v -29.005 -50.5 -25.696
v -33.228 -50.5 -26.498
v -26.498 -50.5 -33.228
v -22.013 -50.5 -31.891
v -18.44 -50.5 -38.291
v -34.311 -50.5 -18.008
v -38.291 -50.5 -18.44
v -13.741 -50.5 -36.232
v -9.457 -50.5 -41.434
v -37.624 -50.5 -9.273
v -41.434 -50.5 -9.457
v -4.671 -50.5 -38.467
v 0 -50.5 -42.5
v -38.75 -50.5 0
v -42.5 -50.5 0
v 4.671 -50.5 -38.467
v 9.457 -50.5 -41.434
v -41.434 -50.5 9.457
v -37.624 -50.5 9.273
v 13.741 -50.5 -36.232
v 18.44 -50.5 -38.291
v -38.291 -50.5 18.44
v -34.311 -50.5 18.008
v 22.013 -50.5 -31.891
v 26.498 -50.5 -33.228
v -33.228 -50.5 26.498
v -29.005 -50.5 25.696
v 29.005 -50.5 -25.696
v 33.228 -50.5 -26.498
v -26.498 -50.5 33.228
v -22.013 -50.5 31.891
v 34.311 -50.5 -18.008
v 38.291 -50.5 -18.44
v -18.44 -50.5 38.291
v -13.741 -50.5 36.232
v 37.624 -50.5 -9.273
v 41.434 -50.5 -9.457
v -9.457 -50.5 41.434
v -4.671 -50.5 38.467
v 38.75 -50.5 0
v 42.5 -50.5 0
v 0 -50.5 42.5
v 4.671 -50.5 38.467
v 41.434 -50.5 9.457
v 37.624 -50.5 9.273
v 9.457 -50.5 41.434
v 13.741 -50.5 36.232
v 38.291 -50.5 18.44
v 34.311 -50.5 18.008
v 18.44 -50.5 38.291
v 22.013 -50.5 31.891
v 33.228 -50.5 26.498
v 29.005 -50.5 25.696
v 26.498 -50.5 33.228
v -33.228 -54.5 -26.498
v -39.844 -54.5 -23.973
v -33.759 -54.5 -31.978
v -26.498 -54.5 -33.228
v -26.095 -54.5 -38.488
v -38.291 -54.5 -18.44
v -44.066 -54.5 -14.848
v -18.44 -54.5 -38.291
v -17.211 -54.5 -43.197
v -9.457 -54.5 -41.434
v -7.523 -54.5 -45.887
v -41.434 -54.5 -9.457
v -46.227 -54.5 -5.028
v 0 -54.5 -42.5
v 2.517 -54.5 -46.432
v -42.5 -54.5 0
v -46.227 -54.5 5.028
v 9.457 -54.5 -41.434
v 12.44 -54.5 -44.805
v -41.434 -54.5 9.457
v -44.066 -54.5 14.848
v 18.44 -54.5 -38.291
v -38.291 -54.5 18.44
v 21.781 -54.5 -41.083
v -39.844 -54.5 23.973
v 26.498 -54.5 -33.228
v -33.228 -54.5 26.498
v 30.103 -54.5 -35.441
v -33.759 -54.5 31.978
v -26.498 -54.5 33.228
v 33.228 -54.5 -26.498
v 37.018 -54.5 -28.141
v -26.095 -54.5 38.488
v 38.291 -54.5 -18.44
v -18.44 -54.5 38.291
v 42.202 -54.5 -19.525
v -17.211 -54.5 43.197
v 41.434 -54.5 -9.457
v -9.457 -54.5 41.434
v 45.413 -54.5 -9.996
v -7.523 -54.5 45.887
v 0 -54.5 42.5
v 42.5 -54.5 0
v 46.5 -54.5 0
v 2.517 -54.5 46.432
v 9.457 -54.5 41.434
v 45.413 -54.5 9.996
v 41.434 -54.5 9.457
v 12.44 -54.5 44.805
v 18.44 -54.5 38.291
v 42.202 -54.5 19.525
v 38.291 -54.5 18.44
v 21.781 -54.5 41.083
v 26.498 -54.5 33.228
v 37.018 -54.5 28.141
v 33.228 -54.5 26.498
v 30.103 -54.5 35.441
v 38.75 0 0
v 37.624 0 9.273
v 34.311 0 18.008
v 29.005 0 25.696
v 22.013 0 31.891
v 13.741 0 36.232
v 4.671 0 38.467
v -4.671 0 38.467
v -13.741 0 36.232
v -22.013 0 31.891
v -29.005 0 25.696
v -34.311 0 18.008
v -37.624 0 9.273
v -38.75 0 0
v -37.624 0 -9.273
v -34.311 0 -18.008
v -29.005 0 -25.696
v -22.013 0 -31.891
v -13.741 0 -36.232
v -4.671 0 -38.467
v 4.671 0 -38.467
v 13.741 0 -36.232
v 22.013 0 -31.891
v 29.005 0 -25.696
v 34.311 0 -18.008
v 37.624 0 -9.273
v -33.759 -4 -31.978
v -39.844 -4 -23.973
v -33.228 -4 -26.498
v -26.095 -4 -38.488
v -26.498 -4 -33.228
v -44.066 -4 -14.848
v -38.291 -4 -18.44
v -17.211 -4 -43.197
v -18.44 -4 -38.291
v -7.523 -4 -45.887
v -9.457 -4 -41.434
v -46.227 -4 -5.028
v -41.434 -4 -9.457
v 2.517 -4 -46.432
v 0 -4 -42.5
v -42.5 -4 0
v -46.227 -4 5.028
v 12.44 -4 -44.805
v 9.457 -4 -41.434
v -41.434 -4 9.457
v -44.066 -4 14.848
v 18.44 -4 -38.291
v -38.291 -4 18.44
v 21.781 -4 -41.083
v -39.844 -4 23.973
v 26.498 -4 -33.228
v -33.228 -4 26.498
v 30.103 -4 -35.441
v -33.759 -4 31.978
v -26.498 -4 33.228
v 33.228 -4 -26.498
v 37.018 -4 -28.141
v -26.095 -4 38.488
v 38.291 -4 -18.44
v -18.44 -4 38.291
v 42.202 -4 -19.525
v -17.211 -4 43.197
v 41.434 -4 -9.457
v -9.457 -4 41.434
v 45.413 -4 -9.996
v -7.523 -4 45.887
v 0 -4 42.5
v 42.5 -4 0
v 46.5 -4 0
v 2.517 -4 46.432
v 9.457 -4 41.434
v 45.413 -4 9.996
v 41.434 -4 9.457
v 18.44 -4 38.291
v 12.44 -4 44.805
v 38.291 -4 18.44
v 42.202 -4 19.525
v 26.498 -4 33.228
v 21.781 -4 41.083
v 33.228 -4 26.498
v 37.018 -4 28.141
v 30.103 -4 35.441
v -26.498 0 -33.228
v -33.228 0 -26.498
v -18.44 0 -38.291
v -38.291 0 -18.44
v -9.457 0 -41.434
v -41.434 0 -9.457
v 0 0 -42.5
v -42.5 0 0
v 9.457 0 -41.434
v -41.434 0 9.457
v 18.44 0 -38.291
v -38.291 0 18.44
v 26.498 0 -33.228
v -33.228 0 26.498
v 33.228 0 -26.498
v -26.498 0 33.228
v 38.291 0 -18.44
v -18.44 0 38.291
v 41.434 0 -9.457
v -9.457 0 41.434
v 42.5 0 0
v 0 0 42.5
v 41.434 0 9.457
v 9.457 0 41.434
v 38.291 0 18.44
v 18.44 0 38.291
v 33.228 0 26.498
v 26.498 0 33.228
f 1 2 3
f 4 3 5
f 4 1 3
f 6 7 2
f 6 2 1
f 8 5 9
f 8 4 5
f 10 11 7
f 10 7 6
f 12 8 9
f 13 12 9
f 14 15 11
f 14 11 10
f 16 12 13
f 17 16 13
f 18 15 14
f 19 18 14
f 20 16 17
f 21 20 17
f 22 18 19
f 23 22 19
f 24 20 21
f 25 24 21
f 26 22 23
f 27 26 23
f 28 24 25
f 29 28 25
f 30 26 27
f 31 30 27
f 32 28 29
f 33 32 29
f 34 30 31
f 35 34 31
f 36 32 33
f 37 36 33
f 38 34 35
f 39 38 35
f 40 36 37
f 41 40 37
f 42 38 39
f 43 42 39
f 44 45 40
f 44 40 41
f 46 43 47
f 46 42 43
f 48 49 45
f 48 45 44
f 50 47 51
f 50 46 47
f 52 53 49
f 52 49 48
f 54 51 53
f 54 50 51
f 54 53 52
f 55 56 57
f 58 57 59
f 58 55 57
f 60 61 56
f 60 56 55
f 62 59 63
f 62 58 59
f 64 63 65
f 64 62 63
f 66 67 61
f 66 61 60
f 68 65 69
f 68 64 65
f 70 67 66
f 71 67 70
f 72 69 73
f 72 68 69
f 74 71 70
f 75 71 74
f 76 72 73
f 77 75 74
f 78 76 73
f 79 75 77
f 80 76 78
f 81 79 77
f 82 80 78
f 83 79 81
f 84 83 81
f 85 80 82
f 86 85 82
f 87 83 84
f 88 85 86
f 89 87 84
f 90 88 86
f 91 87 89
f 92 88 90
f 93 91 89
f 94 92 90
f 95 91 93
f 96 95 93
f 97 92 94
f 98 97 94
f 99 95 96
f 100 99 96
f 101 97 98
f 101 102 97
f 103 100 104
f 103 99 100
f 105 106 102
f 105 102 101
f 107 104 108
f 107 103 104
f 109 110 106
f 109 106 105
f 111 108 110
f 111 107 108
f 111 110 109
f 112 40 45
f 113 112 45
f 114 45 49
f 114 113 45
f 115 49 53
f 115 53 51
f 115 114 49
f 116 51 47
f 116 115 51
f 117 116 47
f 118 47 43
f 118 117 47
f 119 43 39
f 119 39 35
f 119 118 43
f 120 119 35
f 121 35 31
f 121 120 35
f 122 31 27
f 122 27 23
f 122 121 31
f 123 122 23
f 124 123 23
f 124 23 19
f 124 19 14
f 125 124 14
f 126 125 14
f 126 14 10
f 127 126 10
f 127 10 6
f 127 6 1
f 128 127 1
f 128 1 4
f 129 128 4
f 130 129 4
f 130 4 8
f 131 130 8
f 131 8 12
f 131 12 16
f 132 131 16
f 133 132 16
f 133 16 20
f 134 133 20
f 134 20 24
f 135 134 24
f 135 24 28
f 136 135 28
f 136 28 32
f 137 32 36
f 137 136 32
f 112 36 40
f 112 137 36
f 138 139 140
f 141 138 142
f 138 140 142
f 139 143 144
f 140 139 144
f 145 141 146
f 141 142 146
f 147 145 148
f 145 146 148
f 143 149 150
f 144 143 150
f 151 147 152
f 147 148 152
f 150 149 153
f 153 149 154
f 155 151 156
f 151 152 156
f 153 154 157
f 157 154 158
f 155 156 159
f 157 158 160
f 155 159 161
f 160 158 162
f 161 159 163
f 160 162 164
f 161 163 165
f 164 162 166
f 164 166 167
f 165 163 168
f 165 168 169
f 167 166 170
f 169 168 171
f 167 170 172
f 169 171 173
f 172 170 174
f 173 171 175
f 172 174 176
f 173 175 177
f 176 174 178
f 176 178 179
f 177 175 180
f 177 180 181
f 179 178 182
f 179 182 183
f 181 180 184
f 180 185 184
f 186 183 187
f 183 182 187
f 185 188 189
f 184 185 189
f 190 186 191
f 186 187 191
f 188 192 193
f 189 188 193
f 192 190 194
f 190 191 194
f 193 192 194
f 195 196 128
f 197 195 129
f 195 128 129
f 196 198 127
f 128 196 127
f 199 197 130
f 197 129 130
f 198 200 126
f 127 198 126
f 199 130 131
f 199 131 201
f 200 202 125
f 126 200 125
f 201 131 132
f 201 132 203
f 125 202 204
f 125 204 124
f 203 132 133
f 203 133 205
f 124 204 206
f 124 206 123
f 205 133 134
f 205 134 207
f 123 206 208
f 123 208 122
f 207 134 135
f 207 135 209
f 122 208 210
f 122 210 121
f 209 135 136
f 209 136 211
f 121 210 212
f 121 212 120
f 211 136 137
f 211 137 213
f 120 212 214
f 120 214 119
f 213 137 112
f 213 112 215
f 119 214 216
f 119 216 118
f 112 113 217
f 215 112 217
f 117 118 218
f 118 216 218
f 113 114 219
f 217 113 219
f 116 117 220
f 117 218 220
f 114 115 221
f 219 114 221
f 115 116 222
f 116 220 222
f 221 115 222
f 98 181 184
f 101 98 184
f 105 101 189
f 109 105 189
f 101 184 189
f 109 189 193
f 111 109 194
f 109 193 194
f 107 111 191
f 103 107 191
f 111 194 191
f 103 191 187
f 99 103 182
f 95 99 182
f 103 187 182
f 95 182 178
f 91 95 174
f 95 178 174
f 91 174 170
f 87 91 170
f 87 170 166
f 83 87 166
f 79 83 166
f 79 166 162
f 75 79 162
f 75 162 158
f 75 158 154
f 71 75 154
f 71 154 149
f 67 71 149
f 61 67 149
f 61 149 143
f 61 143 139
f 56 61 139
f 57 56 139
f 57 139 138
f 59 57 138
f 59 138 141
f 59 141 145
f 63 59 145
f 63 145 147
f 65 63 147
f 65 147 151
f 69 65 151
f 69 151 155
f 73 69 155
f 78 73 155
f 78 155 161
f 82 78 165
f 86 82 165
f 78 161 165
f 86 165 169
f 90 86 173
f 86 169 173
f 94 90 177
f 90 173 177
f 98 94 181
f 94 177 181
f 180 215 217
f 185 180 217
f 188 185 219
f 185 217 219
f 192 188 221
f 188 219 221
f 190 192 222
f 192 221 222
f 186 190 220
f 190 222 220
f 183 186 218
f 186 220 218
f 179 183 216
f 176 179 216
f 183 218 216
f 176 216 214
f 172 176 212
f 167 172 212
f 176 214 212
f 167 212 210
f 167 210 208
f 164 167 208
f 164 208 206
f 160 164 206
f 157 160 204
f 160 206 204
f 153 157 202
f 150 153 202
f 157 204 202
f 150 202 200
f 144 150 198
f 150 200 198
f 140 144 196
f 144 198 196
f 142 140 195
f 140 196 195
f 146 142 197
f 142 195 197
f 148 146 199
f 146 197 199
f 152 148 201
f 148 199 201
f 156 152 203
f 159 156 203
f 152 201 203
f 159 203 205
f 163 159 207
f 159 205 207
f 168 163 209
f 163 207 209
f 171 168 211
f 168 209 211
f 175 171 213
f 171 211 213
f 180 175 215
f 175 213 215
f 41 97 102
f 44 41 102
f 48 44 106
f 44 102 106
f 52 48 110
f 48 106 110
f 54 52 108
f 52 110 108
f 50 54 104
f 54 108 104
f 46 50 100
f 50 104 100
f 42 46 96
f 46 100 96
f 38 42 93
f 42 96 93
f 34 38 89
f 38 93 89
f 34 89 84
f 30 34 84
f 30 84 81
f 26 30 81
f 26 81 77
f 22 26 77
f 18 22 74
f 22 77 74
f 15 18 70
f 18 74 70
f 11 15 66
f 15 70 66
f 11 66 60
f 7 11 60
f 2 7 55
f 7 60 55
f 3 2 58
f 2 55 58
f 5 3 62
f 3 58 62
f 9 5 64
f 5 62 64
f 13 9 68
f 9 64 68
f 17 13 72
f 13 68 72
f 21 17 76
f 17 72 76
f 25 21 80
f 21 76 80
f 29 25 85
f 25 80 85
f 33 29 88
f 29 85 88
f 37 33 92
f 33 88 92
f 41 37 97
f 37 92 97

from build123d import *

# Parameters (mm, degrees)
F2_R     = 46.5
F2_R_2   = 42.5
F2_R_3   = 38.75
F3_DEPTH = 54.5
F4_DEPTH = 4
F5_R     = 42.5
F5_R_2   = 38.75
F6_DEPTH = 4


with BuildPart() as f3:
    # F2 (on Front) → F3 (new body)
    with BuildSketch(Plane.XZ):
        Circle(F2_R)
        Circle(F2_R_2, mode=Mode.SUBTRACT)
        Circle(F2_R_2)
        Circle(F2_R_3, mode=Mode.SUBTRACT)
    extrude(amount=F3_DEPTH)

    # F2 (on Front) → F4 (cut)
    with BuildSketch(Plane.XZ):
        Circle(F2_R)
        Circle(F2_R_2, mode=Mode.SUBTRACT)
    extrude(amount=F4_DEPTH, mode=Mode.SUBTRACT)

    # F5 (on face) → F6 (cut)
    with BuildSketch(Plane.XZ.offset(54.5)):
        Circle(F5_R)
        Circle(F5_R_2, mode=Mode.SUBTRACT)
    extrude(amount=-F6_DEPTH, mode=Mode.SUBTRACT)


solid = f3.part
